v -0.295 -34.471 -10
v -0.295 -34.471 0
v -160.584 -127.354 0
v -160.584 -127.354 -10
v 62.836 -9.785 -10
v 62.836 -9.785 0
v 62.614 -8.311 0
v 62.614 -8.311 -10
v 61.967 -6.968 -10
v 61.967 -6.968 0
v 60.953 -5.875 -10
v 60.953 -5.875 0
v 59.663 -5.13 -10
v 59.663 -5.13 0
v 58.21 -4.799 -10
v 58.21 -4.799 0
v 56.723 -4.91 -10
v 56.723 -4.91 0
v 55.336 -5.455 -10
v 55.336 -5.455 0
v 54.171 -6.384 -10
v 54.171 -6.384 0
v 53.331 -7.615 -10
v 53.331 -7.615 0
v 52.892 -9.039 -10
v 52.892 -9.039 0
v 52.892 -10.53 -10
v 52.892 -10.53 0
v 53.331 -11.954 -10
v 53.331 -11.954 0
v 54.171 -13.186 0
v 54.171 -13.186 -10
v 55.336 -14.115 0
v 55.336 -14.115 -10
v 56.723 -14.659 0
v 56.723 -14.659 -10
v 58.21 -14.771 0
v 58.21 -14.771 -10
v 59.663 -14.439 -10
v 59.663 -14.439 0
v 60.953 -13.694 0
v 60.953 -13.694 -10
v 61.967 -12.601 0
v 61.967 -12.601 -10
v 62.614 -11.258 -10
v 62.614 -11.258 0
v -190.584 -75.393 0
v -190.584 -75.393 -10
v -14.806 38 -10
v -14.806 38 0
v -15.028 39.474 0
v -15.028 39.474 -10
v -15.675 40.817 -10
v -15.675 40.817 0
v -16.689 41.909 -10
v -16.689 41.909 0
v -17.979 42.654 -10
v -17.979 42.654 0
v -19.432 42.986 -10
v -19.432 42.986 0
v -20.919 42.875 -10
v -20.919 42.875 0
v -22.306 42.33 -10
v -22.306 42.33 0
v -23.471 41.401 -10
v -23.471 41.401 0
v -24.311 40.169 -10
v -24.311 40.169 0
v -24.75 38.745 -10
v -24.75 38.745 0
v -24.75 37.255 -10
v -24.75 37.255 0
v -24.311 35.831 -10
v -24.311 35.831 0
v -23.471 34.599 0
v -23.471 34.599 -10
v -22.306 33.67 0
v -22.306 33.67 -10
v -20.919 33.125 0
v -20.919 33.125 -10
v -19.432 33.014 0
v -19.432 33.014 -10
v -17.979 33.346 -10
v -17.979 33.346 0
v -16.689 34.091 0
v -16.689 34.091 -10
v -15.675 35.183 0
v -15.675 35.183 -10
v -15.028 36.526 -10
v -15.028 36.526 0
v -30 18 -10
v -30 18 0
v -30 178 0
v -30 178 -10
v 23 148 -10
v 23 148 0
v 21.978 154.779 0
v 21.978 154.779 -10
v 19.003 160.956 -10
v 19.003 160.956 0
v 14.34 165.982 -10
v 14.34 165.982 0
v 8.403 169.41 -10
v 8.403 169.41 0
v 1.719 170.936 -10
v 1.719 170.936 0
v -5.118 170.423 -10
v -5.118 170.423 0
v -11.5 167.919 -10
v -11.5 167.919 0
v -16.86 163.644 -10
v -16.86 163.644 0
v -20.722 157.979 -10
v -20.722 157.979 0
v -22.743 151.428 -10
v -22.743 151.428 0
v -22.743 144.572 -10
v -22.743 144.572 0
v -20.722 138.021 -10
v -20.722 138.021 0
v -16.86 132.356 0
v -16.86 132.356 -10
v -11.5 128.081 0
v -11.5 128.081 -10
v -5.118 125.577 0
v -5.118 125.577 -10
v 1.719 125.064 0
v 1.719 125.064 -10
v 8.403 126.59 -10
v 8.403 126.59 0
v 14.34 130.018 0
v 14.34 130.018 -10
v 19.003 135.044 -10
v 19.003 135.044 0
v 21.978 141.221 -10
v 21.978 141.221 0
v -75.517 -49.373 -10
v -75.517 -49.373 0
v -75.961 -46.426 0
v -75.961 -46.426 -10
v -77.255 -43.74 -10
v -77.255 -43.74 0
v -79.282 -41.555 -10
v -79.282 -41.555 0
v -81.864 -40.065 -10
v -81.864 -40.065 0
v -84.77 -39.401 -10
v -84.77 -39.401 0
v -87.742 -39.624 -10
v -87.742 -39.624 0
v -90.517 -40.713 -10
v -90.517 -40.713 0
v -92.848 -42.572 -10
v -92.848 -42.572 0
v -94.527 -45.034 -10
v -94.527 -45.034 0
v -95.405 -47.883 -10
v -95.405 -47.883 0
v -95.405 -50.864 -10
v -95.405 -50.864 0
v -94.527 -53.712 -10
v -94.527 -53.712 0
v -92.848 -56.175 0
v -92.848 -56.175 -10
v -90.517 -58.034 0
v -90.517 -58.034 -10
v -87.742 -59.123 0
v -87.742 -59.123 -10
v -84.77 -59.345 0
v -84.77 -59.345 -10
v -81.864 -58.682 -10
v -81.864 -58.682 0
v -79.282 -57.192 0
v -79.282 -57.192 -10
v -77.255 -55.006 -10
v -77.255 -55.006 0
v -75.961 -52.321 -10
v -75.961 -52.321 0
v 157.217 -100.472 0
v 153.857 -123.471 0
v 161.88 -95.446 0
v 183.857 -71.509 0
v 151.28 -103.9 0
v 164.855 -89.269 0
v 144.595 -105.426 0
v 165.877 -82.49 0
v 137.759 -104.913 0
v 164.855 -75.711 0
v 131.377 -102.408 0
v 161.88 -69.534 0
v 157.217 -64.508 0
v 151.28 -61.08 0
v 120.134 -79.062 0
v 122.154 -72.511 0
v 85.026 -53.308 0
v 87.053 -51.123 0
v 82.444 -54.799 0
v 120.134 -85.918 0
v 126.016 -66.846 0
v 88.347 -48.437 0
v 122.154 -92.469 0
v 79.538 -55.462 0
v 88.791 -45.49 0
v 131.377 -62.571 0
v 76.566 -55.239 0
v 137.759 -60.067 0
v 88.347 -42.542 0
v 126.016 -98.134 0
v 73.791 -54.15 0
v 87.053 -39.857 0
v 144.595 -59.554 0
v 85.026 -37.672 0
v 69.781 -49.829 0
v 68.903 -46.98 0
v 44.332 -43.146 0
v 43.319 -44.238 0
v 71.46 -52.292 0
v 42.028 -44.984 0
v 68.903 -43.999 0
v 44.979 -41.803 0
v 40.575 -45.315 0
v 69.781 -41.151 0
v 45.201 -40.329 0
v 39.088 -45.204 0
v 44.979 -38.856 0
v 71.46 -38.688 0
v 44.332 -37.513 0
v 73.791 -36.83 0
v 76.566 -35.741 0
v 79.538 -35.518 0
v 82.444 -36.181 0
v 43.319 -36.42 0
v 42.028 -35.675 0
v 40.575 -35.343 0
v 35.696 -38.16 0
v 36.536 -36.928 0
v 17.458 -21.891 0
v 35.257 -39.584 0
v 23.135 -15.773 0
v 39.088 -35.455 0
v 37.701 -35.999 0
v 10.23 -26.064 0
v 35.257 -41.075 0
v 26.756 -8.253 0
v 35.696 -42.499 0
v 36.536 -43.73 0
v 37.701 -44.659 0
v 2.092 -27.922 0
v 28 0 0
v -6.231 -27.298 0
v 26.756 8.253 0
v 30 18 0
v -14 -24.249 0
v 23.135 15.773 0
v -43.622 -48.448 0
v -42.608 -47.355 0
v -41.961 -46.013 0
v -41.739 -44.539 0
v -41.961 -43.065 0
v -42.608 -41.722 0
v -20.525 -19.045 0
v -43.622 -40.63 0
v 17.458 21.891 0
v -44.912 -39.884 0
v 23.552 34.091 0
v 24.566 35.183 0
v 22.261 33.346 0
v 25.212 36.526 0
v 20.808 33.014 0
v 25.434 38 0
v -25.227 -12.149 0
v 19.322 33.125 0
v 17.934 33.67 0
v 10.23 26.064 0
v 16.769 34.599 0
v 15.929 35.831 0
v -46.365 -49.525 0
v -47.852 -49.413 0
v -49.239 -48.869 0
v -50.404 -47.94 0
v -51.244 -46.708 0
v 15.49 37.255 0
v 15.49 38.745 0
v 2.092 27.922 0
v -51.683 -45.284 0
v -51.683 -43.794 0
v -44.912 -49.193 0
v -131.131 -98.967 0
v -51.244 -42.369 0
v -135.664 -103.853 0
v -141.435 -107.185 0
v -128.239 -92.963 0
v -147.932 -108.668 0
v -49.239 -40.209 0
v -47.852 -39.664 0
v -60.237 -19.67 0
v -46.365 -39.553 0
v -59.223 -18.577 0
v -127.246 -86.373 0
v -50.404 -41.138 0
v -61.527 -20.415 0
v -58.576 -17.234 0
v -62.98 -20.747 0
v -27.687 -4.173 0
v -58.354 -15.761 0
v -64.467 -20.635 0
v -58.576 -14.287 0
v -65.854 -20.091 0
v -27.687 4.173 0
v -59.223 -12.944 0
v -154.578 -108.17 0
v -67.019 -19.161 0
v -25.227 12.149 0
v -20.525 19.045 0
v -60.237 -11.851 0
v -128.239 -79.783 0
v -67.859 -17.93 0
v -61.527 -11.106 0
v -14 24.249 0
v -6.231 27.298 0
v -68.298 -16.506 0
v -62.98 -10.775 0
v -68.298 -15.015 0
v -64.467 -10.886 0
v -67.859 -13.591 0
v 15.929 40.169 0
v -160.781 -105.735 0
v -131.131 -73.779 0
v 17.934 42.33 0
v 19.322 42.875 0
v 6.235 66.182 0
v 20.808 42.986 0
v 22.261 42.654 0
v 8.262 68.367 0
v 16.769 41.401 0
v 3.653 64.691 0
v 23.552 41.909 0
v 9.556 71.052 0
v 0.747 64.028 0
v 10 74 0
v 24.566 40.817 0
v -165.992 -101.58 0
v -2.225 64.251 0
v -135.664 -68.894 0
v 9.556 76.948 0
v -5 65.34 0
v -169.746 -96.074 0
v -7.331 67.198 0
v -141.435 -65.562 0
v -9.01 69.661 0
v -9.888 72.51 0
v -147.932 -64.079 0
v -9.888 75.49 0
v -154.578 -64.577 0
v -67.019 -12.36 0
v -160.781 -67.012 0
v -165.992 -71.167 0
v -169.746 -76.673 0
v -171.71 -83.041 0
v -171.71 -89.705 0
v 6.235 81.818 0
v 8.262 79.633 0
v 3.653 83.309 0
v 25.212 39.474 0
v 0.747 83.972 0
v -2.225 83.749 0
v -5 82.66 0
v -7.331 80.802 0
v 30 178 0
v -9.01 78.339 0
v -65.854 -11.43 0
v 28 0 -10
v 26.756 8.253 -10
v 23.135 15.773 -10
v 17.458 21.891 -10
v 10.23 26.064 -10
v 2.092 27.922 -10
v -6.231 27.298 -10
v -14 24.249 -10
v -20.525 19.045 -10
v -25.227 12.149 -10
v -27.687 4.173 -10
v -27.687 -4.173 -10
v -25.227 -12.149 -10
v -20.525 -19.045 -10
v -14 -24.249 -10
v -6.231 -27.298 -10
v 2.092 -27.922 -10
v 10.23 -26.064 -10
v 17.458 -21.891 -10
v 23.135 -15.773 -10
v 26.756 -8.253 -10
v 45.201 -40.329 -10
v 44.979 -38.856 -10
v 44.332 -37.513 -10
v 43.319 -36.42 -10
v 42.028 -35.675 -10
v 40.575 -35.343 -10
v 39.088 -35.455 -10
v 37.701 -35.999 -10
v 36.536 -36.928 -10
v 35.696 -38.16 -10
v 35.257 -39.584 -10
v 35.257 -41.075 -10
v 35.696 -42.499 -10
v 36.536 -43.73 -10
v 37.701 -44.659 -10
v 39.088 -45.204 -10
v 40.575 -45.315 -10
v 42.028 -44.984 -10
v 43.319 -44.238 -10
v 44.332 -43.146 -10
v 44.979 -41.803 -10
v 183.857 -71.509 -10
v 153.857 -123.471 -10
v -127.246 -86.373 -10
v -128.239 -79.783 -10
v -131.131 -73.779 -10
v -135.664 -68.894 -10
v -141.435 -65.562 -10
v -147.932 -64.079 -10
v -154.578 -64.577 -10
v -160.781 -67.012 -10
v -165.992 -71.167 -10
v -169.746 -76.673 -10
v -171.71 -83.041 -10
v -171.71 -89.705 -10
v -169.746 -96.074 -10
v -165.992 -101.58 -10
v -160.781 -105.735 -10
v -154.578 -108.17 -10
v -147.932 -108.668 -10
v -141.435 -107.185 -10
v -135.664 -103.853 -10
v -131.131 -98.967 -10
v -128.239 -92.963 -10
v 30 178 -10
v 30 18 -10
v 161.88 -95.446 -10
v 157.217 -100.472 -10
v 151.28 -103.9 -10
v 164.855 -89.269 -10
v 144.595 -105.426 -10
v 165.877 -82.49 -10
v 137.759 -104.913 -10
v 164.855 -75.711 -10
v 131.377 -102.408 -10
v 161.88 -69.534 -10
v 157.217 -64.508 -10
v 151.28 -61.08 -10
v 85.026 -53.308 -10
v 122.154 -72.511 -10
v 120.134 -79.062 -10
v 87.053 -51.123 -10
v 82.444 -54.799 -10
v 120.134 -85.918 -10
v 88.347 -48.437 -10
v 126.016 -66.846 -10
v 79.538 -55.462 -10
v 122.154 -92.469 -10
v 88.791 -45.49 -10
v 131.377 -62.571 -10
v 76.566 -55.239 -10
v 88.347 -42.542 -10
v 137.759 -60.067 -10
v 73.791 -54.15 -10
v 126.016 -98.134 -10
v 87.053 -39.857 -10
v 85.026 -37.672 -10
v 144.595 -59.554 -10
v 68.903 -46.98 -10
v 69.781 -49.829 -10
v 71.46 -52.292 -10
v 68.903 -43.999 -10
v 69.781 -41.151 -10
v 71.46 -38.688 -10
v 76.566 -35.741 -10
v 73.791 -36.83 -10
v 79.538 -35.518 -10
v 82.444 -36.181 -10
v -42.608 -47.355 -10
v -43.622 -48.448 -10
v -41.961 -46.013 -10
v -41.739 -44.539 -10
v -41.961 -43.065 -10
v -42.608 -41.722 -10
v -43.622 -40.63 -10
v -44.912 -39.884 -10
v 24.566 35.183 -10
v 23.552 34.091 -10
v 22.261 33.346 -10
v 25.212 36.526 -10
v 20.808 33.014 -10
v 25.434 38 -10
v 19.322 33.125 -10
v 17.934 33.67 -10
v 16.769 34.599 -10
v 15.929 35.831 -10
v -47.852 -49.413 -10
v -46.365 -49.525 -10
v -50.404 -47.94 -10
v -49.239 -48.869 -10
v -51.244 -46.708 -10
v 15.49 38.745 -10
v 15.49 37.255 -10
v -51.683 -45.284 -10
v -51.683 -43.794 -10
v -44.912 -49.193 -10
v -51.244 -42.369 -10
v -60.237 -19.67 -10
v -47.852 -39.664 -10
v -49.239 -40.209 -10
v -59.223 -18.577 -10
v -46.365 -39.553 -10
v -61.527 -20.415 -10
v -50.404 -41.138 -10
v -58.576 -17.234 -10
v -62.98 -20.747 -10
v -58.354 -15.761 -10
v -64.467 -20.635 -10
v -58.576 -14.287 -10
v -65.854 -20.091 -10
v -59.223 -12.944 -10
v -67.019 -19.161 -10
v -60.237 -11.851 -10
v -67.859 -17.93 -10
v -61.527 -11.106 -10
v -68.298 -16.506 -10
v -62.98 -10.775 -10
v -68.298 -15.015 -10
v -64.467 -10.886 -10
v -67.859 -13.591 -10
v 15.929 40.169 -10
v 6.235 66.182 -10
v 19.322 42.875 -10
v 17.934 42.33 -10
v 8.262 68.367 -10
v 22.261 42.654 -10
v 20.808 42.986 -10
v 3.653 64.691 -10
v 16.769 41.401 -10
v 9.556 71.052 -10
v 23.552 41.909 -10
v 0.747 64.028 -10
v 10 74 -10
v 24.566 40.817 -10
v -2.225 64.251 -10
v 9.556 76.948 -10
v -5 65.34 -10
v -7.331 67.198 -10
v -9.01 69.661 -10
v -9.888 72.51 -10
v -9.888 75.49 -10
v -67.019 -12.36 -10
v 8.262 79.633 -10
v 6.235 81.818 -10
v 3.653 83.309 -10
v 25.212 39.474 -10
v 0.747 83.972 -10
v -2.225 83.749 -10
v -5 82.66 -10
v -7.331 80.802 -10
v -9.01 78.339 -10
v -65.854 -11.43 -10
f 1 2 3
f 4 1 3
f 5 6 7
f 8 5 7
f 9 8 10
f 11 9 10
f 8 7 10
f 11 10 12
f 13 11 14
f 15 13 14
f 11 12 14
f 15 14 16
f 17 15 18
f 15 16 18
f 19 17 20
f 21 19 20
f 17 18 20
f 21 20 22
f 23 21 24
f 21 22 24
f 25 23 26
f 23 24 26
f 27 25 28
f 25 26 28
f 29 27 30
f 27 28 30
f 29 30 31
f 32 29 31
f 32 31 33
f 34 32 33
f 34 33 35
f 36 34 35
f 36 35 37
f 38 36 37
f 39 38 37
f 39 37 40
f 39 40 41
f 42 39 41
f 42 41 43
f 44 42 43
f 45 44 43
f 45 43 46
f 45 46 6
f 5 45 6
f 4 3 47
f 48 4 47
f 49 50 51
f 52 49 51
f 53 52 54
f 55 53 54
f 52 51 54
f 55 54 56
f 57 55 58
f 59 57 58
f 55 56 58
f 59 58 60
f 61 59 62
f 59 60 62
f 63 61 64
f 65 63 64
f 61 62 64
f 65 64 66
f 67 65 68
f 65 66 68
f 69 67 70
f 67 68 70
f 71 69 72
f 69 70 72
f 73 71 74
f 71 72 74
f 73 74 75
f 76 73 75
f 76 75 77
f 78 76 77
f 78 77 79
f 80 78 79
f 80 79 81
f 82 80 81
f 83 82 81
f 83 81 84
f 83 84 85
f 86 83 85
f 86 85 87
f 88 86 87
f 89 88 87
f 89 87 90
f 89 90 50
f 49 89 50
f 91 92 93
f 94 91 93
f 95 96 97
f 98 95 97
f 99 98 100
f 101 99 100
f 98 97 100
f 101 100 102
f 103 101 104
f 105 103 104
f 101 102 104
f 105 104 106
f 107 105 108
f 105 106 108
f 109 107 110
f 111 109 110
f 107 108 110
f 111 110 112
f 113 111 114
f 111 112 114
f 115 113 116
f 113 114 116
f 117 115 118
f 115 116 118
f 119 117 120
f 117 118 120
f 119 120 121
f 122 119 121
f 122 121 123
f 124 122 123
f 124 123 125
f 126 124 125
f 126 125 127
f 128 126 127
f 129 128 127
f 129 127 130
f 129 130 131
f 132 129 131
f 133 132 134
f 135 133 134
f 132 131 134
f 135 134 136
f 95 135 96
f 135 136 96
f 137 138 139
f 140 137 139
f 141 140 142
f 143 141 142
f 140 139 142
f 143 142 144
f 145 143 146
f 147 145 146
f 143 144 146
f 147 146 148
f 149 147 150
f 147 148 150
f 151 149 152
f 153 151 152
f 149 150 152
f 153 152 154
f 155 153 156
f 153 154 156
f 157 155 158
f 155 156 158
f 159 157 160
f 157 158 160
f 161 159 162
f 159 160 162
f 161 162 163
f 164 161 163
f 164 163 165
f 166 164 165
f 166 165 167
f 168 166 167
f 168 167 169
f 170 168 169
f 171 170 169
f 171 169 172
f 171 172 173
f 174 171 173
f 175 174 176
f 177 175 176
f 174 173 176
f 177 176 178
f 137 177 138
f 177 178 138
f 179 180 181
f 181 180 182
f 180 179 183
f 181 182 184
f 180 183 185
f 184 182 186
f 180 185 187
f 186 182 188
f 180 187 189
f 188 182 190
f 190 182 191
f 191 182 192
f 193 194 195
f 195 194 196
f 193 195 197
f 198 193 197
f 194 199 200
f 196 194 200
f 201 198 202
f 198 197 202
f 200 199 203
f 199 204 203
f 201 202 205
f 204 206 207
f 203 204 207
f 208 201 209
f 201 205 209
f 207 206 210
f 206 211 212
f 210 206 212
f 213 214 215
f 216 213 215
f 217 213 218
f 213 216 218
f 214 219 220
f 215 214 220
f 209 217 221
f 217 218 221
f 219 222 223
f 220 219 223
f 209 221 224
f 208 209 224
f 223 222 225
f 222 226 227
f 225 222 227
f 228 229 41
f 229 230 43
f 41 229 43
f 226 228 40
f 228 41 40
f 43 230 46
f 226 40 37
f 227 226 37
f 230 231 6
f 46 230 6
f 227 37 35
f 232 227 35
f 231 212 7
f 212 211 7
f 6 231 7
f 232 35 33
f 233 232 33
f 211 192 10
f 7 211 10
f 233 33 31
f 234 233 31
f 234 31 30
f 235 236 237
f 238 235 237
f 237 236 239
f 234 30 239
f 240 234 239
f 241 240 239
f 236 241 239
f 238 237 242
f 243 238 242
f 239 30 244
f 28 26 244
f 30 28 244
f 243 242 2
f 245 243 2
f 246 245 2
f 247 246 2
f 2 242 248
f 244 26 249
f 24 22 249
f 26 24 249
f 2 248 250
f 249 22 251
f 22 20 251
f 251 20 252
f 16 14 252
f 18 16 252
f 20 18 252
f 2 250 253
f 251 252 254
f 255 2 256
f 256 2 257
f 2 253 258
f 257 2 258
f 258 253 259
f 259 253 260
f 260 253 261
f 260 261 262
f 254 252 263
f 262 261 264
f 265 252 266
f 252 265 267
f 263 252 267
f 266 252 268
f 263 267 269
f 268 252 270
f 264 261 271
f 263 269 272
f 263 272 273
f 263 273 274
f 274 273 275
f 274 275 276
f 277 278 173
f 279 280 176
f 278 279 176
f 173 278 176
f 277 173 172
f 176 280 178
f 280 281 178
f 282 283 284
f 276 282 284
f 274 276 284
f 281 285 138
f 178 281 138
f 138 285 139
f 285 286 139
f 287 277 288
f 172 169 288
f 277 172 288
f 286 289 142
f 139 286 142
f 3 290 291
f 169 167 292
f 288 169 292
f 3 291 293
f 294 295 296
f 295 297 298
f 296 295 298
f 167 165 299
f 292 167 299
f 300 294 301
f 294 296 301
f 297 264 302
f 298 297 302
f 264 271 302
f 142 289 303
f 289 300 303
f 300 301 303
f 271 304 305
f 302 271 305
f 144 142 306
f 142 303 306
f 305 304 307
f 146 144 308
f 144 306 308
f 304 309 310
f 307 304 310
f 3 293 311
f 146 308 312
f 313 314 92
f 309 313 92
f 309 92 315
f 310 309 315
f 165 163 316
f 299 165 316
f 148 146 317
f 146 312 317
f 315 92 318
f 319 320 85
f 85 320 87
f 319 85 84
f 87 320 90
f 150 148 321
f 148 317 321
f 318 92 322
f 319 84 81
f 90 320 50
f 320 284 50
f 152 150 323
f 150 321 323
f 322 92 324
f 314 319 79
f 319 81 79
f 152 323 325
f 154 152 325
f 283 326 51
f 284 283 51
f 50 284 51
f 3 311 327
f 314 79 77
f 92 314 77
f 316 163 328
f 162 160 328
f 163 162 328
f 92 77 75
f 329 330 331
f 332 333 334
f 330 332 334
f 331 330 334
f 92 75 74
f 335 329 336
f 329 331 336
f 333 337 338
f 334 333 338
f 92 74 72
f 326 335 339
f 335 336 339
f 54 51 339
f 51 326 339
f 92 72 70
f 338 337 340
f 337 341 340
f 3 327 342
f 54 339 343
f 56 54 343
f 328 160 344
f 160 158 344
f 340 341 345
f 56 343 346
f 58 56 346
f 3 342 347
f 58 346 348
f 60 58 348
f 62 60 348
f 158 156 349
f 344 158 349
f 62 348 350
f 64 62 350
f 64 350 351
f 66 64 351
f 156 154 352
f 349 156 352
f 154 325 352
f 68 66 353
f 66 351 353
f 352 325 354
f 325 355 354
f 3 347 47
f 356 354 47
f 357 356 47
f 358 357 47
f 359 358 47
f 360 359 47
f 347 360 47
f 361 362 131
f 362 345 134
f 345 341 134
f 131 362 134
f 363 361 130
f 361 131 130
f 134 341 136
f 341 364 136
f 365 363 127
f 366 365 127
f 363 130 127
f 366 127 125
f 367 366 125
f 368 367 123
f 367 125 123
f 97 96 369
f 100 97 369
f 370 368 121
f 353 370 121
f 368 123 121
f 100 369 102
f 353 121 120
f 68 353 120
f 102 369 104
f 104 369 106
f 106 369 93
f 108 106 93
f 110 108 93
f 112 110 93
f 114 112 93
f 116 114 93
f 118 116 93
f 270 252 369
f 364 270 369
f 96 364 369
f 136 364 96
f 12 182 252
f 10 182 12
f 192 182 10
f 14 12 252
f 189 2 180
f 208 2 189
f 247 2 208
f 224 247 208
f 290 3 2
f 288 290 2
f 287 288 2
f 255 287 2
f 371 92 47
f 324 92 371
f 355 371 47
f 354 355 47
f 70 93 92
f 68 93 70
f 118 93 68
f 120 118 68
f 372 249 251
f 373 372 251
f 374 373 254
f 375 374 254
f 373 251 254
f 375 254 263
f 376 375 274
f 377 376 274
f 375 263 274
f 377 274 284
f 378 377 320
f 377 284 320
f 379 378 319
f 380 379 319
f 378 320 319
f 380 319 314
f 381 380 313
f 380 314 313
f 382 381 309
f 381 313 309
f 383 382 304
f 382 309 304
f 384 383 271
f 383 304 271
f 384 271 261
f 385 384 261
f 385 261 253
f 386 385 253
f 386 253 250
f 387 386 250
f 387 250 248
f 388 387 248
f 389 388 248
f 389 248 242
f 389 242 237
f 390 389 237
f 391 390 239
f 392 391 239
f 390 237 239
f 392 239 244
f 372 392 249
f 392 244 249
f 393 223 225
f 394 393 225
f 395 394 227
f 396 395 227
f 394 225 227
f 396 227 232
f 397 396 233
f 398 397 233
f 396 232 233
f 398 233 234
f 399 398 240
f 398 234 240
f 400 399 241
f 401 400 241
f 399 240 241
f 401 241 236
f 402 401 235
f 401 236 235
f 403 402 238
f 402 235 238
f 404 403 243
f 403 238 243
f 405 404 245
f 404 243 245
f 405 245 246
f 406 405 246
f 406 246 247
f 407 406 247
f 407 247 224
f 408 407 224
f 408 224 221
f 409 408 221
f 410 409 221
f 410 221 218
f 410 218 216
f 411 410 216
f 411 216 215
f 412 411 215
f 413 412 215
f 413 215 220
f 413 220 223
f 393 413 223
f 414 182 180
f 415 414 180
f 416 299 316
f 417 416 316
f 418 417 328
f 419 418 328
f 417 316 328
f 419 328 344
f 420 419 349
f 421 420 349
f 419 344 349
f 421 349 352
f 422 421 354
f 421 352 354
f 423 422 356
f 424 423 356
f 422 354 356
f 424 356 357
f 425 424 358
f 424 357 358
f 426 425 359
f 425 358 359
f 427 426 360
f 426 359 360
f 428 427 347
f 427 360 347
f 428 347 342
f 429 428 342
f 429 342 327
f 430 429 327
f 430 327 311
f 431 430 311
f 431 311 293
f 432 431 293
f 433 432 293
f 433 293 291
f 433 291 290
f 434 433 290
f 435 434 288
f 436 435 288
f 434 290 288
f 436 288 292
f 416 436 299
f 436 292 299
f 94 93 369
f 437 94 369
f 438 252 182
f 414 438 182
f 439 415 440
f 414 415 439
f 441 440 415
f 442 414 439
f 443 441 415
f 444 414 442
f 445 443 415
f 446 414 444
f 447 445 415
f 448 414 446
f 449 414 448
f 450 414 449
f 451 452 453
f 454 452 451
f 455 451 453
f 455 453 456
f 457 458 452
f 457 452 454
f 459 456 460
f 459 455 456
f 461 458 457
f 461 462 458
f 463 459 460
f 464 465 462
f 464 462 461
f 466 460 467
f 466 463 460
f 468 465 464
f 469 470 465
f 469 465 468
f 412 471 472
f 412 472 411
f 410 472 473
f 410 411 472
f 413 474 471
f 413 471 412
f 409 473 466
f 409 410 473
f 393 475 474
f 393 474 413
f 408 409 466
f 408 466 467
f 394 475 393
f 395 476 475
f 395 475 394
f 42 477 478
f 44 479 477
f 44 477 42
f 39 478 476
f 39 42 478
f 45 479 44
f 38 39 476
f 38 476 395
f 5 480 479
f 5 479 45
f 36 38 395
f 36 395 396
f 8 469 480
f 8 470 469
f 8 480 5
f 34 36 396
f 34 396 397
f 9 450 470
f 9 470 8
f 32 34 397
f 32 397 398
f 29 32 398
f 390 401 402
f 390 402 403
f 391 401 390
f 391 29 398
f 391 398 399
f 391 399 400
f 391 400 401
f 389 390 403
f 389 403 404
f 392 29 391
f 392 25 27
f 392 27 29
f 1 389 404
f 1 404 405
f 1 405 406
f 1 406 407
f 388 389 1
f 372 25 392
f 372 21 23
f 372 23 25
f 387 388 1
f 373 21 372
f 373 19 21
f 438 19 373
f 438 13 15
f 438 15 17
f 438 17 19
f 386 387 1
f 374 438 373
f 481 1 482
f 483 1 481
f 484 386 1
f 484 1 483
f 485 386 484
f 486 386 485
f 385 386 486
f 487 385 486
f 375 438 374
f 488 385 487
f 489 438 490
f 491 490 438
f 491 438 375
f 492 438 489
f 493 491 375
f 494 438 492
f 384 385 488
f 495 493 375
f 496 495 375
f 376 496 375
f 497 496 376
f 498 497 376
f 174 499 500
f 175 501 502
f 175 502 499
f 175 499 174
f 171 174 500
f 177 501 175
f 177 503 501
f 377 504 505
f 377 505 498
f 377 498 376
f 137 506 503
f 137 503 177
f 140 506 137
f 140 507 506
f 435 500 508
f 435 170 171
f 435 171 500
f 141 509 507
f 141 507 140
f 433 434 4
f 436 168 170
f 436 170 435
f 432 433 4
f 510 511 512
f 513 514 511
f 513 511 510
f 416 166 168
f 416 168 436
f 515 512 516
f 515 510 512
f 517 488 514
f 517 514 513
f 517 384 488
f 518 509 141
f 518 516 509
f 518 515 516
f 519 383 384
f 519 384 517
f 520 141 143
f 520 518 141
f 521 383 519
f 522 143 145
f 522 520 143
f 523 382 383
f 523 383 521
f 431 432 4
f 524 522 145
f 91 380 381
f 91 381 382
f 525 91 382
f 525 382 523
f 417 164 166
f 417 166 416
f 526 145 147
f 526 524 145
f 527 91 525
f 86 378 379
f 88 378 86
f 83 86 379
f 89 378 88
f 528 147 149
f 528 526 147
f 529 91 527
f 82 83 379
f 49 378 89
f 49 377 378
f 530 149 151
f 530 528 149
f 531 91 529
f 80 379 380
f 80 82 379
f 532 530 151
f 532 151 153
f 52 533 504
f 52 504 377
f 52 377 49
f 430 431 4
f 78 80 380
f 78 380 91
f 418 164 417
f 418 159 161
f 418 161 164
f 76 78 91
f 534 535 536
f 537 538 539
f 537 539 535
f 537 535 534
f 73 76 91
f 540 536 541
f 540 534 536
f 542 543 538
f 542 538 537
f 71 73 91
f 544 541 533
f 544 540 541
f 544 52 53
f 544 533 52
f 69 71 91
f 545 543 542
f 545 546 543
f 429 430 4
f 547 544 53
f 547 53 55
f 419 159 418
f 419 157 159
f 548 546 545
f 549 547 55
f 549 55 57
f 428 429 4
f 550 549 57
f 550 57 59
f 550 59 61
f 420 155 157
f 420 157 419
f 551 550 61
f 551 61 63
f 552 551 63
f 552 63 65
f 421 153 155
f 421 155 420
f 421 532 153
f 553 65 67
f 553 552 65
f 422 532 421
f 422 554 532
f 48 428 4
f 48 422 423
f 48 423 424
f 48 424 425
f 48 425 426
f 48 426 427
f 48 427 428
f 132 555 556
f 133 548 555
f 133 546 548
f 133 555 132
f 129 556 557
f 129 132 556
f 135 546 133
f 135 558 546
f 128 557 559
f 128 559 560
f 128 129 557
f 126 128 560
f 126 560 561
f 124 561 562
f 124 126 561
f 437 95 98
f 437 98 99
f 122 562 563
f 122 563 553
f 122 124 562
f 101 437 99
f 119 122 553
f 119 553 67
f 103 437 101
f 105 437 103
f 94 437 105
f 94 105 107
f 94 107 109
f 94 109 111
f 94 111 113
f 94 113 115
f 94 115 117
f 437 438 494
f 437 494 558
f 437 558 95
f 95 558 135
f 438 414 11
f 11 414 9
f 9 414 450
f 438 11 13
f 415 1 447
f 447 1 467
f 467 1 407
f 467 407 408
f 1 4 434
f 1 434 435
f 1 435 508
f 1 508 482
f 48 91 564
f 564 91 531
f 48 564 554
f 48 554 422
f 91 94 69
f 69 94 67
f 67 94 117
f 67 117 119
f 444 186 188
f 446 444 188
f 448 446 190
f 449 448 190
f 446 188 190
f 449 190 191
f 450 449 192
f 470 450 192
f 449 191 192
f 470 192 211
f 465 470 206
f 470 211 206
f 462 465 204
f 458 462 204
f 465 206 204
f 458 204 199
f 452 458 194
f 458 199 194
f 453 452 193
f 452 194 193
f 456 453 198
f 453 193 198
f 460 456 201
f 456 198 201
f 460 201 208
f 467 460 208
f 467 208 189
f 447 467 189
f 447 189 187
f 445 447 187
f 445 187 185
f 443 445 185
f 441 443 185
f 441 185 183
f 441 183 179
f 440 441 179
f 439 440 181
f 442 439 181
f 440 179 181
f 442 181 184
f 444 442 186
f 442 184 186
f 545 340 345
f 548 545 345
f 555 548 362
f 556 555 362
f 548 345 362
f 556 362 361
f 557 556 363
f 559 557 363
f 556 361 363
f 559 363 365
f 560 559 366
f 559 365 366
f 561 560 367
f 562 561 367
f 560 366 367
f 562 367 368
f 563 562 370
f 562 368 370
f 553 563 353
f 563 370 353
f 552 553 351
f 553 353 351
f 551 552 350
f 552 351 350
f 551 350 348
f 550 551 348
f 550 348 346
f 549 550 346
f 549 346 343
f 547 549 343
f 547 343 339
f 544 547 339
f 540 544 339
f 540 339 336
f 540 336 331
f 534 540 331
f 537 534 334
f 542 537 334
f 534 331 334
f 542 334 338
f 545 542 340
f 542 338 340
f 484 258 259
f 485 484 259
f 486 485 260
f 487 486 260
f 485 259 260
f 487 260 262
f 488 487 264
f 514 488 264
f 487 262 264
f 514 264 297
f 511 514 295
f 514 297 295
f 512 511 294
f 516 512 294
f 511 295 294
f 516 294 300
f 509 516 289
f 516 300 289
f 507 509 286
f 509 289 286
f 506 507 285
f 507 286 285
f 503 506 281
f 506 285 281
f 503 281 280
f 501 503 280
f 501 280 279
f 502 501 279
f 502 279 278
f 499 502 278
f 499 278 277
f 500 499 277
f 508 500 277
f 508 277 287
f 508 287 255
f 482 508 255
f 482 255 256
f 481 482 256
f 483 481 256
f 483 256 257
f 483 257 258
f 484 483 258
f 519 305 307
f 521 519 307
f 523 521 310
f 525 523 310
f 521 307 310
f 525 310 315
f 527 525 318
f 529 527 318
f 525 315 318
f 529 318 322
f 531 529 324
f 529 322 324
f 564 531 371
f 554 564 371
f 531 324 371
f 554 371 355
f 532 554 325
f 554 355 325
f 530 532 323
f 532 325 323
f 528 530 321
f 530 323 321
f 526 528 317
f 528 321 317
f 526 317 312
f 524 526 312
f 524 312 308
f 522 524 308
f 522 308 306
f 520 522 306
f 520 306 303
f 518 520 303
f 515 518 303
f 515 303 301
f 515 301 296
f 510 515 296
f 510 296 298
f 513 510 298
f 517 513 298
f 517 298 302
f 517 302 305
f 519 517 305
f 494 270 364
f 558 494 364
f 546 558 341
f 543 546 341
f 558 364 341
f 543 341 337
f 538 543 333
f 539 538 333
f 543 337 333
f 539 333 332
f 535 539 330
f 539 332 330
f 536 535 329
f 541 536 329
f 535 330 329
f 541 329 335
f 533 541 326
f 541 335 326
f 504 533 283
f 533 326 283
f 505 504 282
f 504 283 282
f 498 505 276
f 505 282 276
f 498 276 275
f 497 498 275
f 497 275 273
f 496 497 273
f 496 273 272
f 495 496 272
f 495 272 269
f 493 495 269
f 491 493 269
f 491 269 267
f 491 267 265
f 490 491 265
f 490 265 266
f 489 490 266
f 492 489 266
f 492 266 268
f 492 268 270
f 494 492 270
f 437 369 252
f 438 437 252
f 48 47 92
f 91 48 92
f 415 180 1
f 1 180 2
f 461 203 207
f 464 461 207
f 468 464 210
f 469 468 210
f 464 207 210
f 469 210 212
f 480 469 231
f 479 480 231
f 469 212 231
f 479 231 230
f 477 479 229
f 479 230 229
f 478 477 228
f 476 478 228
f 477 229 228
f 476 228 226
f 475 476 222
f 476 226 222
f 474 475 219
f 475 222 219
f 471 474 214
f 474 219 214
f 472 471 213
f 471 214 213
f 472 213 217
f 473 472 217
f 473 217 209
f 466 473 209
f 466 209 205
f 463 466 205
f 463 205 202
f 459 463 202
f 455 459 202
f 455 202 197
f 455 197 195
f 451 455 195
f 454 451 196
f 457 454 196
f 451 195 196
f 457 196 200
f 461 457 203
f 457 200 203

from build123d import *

# Parameters (mm, degrees)
SKETCH1_R           = 28
SKETCH1_R_2         = 23
SKETCH1_R_3         = 22.356889663
SKETCH1_R_4         = 10
BOSS_EXTRUDE5_DEPTH = 10
SKETCH3_R           = 5
CUT_EXTRUDE1_DEPTH  = 261.971545909


with BuildPart() as part:
    # Sketch1 → Boss-Extrude5 (new body)
    with BuildSketch(Plane.XY):
        Polygon((-30, 178), (30, 178), (30, 18), (183.857450853, -71.509132591), (153.857450853, -123.470656818), (-0.295071021, -34.470656818), (-160.583702803, -127.354060192), (-190.583702803, -75.392535965), (-30, 18), align=None)
        Circle(SKETCH1_R, mode=Mode.SUBTRACT)
        with Locations((0, 148)):
            Circle(SKETCH1_R_2, mode=Mode.SUBTRACT)
        with Locations((-149.602940689, -86.373298079)):
            Circle(SKETCH1_R_3, mode=Mode.SUBTRACT)
        with Locations((142.876688739, -82.489894704)):
            Circle(SKETCH1_R_2, mode=Mode.SUBTRACT)
        with Locations((0, 74)):
            Circle(SKETCH1_R_4, mode=Mode.SUBTRACT)
        with Locations((-85.517060809, -49.373298079)):
            Circle(SKETCH1_R_4, mode=Mode.SUBTRACT)
        with Locations((78.790808859, -45.489894704)):
            Circle(SKETCH1_R_4, mode=Mode.SUBTRACT)
    extrude(amount=-BOSS_EXTRUDE5_DEPTH)

    # Sketch3 → Cut-Extrude1 (cut, through all)
    with BuildSketch(Plane.XY):
        with Locations((-63.35415014, -15.760585401)):
            Circle(SKETCH3_R)
        with Locations((-46.739077881, -44.538734725)):
            Circle(SKETCH3_R)
        with Locations((40.201063697, -40.329293976)):
            Circle(SKETCH3_R)
        with Locations((57.836027276, -9.784641068)):
            Circle(SKETCH3_R)
        with Locations((-19.80604921, 38)):
            Circle(SKETCH3_R)
        with Locations((20.434338159, 38)):
            Circle(SKETCH3_R)
    extrude(amount=-CUT_EXTRUDE1_DEPTH, mode=Mode.SUBTRACT)


solid = part.part
